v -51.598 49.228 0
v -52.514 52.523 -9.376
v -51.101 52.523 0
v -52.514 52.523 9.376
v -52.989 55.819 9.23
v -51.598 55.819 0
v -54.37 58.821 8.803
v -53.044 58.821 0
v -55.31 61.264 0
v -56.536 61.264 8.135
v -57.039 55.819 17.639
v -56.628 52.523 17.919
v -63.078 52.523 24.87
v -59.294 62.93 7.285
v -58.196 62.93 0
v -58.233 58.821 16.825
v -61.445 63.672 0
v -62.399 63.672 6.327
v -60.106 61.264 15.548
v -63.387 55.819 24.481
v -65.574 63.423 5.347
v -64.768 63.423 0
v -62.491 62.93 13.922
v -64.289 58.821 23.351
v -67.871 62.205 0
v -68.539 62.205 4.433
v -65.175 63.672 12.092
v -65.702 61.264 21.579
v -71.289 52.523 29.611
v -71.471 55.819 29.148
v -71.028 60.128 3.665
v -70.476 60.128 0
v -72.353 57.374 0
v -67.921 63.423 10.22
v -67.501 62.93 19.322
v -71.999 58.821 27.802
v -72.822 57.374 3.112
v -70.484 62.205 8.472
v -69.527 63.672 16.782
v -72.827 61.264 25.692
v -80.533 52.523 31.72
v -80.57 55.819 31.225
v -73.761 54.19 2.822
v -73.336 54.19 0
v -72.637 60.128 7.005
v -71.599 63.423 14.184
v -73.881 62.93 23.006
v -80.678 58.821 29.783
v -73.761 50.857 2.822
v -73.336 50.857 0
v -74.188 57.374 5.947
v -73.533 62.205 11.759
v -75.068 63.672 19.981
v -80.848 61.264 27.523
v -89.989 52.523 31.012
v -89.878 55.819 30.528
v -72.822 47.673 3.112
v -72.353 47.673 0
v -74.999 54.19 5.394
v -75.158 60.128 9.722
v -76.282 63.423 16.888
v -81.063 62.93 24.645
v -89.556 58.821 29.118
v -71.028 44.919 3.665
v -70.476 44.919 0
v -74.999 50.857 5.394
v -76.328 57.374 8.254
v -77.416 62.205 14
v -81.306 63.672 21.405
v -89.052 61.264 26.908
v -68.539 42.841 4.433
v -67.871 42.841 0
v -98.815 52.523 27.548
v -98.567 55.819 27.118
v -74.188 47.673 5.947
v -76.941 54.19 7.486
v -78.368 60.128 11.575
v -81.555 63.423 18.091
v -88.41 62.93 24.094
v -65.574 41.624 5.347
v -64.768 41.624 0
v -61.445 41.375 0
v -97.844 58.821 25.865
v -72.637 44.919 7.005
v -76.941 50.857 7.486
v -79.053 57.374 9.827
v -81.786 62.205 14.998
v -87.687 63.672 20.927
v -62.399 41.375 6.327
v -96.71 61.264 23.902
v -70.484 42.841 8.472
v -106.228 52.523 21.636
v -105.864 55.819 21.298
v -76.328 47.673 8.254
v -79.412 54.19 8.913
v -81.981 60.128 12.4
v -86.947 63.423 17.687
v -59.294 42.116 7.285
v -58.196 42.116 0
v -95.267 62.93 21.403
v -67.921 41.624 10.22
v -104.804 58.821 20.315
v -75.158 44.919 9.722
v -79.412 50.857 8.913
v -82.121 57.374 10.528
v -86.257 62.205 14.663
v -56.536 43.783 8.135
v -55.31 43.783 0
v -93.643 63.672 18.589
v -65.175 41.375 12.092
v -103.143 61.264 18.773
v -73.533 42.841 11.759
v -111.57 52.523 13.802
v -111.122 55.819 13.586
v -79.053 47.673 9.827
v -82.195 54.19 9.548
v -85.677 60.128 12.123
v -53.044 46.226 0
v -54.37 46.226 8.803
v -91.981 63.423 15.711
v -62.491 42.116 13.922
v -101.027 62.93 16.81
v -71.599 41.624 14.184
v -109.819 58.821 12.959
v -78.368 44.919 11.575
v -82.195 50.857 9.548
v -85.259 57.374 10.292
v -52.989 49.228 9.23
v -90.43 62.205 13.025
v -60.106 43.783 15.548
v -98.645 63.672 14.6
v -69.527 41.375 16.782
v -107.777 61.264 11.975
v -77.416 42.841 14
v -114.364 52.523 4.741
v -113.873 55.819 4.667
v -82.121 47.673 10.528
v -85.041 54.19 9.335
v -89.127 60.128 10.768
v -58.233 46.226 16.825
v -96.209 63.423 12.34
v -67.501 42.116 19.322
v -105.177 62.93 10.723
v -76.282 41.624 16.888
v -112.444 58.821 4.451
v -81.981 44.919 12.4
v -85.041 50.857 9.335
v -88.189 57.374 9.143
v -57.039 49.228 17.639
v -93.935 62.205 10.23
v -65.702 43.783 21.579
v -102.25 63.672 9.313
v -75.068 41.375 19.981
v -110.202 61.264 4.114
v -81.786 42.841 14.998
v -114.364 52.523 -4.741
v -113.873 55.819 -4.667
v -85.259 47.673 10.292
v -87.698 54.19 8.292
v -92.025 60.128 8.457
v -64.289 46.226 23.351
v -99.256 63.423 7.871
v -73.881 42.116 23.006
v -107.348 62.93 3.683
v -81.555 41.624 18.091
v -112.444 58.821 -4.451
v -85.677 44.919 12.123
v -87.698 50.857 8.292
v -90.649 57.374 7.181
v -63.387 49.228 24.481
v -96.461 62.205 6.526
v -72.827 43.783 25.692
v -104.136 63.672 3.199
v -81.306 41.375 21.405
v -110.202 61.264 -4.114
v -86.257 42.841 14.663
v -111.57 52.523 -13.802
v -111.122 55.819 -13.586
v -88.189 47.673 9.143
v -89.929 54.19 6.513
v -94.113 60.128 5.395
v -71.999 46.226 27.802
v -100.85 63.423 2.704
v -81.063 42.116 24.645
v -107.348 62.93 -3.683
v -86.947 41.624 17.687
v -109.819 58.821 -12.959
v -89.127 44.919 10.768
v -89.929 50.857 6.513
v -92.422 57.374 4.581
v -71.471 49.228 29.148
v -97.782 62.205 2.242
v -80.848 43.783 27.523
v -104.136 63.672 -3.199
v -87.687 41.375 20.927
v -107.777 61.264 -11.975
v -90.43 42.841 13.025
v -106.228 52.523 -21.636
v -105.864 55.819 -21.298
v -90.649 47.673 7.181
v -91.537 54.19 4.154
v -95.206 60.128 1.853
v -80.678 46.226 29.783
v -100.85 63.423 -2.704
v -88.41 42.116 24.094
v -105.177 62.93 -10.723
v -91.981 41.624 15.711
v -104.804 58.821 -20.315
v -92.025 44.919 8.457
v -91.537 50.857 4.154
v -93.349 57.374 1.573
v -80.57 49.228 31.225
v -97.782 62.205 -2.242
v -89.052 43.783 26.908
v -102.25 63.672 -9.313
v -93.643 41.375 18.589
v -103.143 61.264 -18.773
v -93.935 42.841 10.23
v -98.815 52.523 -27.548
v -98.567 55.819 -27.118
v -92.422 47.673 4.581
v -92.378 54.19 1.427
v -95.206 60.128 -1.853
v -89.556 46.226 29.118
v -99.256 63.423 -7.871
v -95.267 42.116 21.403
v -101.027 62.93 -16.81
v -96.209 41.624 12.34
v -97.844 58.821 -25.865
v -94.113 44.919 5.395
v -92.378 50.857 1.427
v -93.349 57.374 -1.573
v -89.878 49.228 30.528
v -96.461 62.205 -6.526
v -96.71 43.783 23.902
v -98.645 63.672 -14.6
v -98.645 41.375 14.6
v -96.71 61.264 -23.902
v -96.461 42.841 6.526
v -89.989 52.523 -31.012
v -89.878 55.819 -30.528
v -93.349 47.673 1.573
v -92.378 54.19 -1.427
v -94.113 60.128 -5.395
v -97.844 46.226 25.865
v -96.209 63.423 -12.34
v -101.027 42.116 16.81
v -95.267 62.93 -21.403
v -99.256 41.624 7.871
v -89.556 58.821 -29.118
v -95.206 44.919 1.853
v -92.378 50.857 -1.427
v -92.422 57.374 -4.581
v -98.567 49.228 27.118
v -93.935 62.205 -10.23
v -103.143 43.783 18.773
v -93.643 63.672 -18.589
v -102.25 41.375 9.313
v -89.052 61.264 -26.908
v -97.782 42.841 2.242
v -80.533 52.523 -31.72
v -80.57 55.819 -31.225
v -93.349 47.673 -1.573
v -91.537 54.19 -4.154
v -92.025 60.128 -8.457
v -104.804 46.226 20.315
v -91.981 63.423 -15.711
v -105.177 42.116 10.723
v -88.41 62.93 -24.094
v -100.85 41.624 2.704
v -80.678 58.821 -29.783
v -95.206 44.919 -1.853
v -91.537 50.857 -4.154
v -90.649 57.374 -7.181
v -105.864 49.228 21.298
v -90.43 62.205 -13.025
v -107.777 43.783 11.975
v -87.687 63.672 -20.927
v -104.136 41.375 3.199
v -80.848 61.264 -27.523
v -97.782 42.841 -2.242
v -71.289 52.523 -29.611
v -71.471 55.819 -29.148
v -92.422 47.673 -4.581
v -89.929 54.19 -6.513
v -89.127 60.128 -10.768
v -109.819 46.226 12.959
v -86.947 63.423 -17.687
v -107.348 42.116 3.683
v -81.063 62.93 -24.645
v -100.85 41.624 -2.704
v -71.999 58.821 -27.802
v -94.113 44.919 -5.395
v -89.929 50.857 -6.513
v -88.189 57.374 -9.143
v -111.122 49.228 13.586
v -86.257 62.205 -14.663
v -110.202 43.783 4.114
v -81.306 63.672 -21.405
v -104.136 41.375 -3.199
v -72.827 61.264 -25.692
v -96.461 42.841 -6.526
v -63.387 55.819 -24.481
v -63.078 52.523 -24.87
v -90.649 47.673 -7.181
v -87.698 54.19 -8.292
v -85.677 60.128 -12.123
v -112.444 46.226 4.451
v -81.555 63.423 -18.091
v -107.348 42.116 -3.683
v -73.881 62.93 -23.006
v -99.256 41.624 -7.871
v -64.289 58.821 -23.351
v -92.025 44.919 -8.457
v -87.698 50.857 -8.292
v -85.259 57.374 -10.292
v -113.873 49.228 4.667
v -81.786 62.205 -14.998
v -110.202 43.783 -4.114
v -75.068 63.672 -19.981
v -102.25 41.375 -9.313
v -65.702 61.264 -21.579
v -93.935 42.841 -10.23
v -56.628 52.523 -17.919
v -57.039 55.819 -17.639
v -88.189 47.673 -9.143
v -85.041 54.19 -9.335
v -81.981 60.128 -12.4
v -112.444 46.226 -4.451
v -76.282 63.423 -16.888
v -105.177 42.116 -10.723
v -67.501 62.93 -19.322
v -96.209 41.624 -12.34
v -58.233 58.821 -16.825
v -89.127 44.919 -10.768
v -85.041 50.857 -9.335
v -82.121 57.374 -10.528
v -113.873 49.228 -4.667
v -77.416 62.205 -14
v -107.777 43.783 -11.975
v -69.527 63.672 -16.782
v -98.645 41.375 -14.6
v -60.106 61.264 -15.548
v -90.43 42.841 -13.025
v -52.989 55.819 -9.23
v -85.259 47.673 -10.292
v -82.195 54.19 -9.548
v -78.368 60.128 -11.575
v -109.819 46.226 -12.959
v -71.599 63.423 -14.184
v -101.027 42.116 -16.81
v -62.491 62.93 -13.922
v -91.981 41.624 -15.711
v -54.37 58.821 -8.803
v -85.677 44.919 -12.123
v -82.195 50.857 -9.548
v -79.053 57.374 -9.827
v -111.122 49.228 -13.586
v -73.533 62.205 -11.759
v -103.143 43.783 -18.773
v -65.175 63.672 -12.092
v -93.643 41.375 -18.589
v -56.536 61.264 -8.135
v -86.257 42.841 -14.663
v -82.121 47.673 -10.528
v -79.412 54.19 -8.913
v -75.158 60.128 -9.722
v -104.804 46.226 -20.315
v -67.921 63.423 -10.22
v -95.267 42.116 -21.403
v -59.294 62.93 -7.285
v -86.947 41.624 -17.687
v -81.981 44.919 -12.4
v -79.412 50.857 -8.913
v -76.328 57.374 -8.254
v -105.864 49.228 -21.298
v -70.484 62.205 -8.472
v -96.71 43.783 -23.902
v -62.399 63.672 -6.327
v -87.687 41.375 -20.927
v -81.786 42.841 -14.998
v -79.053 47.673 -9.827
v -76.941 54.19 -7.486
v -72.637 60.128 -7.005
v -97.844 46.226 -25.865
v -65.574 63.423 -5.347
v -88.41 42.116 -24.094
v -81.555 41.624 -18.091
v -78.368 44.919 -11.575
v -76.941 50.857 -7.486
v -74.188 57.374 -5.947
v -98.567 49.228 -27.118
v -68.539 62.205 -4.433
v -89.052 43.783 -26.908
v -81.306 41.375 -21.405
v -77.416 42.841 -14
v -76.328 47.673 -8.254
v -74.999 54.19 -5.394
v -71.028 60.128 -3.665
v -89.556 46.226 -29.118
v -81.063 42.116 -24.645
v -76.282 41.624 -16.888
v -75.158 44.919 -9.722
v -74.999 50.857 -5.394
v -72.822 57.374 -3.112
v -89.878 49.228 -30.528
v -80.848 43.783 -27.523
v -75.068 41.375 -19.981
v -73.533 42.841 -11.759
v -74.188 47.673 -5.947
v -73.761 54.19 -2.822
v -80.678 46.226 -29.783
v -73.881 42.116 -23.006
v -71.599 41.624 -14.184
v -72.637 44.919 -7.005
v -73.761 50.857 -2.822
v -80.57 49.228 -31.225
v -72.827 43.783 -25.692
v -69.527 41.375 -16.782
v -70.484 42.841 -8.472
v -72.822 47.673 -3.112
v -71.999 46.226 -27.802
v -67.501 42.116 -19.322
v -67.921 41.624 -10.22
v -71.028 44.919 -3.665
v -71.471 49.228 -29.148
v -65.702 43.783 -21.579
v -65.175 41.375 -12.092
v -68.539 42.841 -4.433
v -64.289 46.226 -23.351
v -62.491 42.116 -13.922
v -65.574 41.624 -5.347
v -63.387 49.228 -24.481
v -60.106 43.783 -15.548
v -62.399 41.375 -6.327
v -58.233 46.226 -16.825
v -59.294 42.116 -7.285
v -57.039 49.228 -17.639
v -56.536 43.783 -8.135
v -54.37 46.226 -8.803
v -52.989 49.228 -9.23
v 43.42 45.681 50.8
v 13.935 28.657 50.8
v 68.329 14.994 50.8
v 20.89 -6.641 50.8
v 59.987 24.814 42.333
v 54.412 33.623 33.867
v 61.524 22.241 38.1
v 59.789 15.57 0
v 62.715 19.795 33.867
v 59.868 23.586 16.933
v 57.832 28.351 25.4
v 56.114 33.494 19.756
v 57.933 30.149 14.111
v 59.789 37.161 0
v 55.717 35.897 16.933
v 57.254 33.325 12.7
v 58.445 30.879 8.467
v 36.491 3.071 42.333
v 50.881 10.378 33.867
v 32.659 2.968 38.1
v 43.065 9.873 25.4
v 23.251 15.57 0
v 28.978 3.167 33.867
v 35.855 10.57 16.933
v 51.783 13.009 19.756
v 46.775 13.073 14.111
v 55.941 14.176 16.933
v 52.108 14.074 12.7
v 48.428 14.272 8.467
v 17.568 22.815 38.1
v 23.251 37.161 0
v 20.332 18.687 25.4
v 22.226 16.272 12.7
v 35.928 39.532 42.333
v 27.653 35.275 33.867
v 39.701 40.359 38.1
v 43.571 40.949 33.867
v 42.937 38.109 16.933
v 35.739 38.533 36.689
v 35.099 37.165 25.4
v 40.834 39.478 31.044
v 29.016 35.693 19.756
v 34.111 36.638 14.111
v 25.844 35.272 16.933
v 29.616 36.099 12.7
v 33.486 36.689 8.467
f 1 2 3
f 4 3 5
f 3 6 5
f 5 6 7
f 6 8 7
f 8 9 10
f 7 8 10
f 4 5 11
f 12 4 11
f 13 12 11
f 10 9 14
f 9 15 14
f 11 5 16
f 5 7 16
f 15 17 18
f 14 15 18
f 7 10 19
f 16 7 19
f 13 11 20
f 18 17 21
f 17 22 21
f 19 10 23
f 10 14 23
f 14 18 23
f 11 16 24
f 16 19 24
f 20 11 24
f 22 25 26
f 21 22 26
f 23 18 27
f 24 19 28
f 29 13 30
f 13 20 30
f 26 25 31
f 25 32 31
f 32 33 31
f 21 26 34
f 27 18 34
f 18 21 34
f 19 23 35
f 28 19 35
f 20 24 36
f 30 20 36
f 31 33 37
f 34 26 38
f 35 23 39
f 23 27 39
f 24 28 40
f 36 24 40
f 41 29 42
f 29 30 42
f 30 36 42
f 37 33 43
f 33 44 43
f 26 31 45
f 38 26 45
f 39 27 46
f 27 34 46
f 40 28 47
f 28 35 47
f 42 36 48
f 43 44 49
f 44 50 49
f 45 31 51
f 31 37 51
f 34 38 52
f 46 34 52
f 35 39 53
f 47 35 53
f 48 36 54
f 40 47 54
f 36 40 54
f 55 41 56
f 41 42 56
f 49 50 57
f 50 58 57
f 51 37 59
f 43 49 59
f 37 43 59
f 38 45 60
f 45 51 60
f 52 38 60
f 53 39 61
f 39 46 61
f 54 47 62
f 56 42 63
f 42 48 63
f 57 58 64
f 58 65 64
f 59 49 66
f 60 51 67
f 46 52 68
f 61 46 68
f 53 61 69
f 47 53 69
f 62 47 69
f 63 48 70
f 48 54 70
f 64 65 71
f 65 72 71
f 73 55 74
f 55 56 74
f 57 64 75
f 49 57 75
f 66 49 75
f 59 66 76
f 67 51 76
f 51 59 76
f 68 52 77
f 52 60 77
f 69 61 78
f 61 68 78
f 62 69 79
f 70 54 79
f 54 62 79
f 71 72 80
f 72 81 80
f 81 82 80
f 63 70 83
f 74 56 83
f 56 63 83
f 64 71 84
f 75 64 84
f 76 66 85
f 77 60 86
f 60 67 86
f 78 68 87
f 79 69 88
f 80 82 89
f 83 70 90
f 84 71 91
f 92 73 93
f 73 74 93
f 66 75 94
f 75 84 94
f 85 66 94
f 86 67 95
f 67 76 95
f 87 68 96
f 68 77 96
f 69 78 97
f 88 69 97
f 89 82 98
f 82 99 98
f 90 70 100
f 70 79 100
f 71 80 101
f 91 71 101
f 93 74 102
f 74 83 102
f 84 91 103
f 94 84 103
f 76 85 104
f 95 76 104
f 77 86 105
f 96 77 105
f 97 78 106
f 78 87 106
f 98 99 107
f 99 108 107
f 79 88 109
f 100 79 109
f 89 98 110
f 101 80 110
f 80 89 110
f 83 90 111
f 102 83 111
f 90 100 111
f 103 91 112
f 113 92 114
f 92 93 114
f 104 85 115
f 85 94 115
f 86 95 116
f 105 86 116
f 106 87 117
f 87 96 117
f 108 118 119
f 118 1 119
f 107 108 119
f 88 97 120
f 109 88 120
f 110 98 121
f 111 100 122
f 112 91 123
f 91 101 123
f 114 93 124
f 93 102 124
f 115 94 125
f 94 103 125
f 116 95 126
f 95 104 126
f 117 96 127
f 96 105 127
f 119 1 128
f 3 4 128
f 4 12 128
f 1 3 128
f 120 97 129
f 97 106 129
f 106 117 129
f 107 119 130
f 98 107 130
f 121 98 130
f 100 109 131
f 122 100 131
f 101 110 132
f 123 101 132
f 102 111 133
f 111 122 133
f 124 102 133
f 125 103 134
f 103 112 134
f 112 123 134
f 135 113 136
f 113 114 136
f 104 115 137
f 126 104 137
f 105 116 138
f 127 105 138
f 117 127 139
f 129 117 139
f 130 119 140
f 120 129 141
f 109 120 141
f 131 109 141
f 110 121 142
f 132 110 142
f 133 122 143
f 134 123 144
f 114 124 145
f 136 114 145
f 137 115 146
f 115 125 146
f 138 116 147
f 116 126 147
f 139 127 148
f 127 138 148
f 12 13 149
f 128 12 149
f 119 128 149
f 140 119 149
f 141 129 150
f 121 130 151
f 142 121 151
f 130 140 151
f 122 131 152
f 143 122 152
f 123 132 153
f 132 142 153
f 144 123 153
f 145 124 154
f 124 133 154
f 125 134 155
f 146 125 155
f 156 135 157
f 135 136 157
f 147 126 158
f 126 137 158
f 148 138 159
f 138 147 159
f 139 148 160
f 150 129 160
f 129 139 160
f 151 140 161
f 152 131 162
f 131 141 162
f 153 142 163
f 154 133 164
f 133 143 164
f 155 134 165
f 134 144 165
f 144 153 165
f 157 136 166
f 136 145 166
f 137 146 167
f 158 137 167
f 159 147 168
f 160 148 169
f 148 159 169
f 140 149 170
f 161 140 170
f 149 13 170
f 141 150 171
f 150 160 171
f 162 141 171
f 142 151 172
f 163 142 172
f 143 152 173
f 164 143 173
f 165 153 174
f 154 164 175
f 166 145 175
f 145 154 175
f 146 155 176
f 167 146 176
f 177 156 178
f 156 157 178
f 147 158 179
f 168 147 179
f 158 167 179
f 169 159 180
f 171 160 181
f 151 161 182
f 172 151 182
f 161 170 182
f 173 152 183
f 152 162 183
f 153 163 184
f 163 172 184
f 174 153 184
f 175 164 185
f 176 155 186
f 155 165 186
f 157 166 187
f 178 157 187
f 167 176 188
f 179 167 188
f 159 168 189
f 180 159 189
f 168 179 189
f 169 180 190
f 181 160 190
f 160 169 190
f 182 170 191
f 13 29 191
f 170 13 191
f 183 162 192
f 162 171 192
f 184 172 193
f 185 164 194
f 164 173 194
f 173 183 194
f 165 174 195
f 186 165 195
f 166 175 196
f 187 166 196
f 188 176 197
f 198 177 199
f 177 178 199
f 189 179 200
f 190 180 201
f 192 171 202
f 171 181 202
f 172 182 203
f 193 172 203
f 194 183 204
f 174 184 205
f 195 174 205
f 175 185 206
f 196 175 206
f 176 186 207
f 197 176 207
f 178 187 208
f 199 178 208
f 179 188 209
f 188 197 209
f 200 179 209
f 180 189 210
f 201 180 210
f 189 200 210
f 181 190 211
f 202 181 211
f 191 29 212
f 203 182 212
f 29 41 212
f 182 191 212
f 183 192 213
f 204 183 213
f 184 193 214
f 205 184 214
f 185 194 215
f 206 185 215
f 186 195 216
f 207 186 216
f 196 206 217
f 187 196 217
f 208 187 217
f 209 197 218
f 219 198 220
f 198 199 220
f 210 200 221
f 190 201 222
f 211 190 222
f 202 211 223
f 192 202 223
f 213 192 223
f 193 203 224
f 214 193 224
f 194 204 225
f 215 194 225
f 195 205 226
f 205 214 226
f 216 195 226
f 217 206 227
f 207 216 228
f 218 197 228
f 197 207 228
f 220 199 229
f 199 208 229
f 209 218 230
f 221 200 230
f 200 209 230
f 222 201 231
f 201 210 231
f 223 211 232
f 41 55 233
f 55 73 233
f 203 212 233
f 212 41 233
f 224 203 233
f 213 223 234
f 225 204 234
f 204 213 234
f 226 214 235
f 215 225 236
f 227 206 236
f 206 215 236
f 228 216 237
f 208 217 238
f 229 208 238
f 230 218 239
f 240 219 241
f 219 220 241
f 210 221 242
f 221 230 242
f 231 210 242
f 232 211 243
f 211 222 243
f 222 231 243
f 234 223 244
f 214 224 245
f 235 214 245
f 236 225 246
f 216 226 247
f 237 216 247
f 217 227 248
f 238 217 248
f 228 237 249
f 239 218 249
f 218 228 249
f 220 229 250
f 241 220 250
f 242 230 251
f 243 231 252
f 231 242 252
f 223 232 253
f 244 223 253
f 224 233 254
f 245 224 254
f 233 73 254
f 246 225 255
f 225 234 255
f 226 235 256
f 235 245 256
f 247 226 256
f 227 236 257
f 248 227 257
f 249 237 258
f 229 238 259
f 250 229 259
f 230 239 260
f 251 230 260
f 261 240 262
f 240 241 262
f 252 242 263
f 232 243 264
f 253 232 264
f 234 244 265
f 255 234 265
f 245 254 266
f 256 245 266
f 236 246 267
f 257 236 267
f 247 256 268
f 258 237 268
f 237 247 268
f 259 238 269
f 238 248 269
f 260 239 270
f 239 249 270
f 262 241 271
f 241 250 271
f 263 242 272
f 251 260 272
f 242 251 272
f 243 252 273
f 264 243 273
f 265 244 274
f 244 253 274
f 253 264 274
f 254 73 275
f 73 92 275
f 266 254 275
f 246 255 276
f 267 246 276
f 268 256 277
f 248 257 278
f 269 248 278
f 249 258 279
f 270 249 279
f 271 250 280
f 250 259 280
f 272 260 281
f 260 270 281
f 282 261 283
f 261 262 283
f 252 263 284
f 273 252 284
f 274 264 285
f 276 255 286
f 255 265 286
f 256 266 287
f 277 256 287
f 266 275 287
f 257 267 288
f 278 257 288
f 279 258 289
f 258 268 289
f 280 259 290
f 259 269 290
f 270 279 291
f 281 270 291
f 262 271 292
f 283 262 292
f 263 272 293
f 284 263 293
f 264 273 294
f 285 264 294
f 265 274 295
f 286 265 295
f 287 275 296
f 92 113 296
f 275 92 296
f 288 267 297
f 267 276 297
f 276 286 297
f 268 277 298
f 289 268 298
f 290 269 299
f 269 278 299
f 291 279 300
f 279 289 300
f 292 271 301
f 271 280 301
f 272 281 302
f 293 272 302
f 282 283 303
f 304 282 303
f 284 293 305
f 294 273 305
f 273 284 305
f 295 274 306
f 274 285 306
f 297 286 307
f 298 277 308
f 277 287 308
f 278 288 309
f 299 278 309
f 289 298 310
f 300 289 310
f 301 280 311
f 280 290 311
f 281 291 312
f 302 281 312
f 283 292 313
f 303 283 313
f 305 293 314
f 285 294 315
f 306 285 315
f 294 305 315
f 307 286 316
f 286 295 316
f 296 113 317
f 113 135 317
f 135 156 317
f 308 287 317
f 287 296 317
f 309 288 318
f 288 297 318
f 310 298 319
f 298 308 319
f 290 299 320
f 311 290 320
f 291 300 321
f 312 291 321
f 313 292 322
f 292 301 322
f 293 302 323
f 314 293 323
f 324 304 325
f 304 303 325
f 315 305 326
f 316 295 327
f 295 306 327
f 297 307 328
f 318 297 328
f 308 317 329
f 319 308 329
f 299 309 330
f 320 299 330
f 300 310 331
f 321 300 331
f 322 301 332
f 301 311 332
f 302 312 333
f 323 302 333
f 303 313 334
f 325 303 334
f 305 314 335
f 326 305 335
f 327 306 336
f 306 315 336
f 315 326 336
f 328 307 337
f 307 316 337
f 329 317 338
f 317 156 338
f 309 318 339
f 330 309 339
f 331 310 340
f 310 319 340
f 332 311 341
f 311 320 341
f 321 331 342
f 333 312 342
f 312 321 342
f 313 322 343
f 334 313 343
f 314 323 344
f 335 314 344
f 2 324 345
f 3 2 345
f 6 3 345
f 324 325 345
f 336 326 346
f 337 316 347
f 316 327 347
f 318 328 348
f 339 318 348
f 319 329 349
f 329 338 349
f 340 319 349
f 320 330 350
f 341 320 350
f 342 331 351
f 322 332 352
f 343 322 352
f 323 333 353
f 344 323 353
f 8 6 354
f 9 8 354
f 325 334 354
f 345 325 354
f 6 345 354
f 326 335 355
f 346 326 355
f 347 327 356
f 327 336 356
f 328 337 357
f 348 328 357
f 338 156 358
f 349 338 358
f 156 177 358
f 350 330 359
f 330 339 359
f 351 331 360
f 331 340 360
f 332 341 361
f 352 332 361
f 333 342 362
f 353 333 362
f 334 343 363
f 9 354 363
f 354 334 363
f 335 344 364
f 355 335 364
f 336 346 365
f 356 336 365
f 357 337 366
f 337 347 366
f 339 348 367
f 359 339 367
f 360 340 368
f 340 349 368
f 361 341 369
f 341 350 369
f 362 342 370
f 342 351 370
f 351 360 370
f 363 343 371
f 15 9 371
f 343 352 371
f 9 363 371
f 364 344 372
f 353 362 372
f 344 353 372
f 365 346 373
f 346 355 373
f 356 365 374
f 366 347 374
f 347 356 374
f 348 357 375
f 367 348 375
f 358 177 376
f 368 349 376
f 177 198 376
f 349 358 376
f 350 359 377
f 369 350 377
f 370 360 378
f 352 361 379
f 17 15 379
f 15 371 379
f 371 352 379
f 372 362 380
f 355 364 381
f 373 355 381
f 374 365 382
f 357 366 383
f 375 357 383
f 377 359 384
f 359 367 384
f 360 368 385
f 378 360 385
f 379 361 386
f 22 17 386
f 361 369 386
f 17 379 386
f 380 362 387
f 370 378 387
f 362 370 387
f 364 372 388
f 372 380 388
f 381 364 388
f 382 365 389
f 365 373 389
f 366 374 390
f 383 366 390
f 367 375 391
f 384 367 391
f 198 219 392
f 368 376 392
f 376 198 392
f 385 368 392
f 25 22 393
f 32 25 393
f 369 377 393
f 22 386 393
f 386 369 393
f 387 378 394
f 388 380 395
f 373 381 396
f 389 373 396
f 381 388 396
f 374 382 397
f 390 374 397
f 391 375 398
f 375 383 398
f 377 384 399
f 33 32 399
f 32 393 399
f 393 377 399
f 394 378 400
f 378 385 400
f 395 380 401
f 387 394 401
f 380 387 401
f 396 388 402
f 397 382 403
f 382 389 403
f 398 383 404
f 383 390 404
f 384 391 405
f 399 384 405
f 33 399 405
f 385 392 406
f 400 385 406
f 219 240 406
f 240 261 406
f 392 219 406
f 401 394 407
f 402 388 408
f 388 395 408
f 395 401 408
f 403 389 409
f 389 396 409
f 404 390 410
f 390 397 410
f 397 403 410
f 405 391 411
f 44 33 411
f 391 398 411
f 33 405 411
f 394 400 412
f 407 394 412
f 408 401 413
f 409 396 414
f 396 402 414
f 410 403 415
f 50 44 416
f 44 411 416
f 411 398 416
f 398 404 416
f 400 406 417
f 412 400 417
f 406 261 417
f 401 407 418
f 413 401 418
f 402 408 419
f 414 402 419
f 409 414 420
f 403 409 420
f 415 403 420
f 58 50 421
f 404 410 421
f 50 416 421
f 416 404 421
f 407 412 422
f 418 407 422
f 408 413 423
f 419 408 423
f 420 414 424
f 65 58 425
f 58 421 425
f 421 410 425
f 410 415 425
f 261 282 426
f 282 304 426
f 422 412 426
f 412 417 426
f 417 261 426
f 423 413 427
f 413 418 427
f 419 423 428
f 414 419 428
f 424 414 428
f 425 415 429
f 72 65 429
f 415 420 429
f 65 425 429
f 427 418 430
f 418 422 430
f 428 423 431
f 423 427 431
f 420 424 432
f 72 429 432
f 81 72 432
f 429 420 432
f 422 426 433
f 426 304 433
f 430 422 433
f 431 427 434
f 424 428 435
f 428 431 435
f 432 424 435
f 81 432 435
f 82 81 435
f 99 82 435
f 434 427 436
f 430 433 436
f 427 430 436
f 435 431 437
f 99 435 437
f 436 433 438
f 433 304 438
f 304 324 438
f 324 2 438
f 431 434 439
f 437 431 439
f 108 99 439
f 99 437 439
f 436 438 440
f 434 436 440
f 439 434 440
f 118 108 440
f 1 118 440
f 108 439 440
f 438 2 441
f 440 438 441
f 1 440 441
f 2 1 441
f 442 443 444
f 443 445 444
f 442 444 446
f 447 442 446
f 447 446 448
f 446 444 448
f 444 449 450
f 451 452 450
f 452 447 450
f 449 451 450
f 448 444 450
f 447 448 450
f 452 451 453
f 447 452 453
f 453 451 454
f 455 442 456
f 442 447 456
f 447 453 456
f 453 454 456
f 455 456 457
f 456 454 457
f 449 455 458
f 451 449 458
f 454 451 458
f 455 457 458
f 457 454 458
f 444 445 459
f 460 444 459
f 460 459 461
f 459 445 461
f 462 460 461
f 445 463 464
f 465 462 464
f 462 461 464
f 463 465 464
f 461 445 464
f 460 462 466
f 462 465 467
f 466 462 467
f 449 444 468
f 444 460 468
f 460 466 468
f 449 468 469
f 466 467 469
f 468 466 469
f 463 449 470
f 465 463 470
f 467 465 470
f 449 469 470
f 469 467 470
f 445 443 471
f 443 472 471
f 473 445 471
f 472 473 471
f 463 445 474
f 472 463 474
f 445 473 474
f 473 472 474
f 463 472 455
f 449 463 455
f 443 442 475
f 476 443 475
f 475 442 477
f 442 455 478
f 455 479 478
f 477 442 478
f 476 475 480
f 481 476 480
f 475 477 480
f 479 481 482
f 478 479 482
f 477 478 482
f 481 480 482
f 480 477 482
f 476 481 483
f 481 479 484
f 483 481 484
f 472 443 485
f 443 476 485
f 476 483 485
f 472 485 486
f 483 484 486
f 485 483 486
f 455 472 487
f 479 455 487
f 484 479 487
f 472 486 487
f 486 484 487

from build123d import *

# Parameters (mm, degrees)
F0_W = 36.537992
F0_H = 21.590633
F0_R = 11.179722


with BuildPart() as f3:
    # F2 (on offset) → F3 section 0
    with BuildSketch(Plane.XY.offset(50.8)):
        Polygon((13.935128, 28.657244), (20.890336, -6.640986), (68.328768, 14.994361), (43.420492, 45.680626), align=None)
    # F0 (on Top) → F3 section 1
    with BuildSketch(Plane.XY):
        with Locations((41.520446, 26.365479)):
            Rectangle(F0_W, F0_H)
    loft()


with BuildPart() as f4:
    # F0 (on Top) → F4 (revolve)
    with BuildSketch(Plane.XY):
        with Locations((-62.280677, 52.52336)):
            Circle(F0_R)
    revolve(axis=Axis((-82.910329, 50.982073, 0), (0, -1, 0)))


solid = Compound([f3.part, f4.part])
